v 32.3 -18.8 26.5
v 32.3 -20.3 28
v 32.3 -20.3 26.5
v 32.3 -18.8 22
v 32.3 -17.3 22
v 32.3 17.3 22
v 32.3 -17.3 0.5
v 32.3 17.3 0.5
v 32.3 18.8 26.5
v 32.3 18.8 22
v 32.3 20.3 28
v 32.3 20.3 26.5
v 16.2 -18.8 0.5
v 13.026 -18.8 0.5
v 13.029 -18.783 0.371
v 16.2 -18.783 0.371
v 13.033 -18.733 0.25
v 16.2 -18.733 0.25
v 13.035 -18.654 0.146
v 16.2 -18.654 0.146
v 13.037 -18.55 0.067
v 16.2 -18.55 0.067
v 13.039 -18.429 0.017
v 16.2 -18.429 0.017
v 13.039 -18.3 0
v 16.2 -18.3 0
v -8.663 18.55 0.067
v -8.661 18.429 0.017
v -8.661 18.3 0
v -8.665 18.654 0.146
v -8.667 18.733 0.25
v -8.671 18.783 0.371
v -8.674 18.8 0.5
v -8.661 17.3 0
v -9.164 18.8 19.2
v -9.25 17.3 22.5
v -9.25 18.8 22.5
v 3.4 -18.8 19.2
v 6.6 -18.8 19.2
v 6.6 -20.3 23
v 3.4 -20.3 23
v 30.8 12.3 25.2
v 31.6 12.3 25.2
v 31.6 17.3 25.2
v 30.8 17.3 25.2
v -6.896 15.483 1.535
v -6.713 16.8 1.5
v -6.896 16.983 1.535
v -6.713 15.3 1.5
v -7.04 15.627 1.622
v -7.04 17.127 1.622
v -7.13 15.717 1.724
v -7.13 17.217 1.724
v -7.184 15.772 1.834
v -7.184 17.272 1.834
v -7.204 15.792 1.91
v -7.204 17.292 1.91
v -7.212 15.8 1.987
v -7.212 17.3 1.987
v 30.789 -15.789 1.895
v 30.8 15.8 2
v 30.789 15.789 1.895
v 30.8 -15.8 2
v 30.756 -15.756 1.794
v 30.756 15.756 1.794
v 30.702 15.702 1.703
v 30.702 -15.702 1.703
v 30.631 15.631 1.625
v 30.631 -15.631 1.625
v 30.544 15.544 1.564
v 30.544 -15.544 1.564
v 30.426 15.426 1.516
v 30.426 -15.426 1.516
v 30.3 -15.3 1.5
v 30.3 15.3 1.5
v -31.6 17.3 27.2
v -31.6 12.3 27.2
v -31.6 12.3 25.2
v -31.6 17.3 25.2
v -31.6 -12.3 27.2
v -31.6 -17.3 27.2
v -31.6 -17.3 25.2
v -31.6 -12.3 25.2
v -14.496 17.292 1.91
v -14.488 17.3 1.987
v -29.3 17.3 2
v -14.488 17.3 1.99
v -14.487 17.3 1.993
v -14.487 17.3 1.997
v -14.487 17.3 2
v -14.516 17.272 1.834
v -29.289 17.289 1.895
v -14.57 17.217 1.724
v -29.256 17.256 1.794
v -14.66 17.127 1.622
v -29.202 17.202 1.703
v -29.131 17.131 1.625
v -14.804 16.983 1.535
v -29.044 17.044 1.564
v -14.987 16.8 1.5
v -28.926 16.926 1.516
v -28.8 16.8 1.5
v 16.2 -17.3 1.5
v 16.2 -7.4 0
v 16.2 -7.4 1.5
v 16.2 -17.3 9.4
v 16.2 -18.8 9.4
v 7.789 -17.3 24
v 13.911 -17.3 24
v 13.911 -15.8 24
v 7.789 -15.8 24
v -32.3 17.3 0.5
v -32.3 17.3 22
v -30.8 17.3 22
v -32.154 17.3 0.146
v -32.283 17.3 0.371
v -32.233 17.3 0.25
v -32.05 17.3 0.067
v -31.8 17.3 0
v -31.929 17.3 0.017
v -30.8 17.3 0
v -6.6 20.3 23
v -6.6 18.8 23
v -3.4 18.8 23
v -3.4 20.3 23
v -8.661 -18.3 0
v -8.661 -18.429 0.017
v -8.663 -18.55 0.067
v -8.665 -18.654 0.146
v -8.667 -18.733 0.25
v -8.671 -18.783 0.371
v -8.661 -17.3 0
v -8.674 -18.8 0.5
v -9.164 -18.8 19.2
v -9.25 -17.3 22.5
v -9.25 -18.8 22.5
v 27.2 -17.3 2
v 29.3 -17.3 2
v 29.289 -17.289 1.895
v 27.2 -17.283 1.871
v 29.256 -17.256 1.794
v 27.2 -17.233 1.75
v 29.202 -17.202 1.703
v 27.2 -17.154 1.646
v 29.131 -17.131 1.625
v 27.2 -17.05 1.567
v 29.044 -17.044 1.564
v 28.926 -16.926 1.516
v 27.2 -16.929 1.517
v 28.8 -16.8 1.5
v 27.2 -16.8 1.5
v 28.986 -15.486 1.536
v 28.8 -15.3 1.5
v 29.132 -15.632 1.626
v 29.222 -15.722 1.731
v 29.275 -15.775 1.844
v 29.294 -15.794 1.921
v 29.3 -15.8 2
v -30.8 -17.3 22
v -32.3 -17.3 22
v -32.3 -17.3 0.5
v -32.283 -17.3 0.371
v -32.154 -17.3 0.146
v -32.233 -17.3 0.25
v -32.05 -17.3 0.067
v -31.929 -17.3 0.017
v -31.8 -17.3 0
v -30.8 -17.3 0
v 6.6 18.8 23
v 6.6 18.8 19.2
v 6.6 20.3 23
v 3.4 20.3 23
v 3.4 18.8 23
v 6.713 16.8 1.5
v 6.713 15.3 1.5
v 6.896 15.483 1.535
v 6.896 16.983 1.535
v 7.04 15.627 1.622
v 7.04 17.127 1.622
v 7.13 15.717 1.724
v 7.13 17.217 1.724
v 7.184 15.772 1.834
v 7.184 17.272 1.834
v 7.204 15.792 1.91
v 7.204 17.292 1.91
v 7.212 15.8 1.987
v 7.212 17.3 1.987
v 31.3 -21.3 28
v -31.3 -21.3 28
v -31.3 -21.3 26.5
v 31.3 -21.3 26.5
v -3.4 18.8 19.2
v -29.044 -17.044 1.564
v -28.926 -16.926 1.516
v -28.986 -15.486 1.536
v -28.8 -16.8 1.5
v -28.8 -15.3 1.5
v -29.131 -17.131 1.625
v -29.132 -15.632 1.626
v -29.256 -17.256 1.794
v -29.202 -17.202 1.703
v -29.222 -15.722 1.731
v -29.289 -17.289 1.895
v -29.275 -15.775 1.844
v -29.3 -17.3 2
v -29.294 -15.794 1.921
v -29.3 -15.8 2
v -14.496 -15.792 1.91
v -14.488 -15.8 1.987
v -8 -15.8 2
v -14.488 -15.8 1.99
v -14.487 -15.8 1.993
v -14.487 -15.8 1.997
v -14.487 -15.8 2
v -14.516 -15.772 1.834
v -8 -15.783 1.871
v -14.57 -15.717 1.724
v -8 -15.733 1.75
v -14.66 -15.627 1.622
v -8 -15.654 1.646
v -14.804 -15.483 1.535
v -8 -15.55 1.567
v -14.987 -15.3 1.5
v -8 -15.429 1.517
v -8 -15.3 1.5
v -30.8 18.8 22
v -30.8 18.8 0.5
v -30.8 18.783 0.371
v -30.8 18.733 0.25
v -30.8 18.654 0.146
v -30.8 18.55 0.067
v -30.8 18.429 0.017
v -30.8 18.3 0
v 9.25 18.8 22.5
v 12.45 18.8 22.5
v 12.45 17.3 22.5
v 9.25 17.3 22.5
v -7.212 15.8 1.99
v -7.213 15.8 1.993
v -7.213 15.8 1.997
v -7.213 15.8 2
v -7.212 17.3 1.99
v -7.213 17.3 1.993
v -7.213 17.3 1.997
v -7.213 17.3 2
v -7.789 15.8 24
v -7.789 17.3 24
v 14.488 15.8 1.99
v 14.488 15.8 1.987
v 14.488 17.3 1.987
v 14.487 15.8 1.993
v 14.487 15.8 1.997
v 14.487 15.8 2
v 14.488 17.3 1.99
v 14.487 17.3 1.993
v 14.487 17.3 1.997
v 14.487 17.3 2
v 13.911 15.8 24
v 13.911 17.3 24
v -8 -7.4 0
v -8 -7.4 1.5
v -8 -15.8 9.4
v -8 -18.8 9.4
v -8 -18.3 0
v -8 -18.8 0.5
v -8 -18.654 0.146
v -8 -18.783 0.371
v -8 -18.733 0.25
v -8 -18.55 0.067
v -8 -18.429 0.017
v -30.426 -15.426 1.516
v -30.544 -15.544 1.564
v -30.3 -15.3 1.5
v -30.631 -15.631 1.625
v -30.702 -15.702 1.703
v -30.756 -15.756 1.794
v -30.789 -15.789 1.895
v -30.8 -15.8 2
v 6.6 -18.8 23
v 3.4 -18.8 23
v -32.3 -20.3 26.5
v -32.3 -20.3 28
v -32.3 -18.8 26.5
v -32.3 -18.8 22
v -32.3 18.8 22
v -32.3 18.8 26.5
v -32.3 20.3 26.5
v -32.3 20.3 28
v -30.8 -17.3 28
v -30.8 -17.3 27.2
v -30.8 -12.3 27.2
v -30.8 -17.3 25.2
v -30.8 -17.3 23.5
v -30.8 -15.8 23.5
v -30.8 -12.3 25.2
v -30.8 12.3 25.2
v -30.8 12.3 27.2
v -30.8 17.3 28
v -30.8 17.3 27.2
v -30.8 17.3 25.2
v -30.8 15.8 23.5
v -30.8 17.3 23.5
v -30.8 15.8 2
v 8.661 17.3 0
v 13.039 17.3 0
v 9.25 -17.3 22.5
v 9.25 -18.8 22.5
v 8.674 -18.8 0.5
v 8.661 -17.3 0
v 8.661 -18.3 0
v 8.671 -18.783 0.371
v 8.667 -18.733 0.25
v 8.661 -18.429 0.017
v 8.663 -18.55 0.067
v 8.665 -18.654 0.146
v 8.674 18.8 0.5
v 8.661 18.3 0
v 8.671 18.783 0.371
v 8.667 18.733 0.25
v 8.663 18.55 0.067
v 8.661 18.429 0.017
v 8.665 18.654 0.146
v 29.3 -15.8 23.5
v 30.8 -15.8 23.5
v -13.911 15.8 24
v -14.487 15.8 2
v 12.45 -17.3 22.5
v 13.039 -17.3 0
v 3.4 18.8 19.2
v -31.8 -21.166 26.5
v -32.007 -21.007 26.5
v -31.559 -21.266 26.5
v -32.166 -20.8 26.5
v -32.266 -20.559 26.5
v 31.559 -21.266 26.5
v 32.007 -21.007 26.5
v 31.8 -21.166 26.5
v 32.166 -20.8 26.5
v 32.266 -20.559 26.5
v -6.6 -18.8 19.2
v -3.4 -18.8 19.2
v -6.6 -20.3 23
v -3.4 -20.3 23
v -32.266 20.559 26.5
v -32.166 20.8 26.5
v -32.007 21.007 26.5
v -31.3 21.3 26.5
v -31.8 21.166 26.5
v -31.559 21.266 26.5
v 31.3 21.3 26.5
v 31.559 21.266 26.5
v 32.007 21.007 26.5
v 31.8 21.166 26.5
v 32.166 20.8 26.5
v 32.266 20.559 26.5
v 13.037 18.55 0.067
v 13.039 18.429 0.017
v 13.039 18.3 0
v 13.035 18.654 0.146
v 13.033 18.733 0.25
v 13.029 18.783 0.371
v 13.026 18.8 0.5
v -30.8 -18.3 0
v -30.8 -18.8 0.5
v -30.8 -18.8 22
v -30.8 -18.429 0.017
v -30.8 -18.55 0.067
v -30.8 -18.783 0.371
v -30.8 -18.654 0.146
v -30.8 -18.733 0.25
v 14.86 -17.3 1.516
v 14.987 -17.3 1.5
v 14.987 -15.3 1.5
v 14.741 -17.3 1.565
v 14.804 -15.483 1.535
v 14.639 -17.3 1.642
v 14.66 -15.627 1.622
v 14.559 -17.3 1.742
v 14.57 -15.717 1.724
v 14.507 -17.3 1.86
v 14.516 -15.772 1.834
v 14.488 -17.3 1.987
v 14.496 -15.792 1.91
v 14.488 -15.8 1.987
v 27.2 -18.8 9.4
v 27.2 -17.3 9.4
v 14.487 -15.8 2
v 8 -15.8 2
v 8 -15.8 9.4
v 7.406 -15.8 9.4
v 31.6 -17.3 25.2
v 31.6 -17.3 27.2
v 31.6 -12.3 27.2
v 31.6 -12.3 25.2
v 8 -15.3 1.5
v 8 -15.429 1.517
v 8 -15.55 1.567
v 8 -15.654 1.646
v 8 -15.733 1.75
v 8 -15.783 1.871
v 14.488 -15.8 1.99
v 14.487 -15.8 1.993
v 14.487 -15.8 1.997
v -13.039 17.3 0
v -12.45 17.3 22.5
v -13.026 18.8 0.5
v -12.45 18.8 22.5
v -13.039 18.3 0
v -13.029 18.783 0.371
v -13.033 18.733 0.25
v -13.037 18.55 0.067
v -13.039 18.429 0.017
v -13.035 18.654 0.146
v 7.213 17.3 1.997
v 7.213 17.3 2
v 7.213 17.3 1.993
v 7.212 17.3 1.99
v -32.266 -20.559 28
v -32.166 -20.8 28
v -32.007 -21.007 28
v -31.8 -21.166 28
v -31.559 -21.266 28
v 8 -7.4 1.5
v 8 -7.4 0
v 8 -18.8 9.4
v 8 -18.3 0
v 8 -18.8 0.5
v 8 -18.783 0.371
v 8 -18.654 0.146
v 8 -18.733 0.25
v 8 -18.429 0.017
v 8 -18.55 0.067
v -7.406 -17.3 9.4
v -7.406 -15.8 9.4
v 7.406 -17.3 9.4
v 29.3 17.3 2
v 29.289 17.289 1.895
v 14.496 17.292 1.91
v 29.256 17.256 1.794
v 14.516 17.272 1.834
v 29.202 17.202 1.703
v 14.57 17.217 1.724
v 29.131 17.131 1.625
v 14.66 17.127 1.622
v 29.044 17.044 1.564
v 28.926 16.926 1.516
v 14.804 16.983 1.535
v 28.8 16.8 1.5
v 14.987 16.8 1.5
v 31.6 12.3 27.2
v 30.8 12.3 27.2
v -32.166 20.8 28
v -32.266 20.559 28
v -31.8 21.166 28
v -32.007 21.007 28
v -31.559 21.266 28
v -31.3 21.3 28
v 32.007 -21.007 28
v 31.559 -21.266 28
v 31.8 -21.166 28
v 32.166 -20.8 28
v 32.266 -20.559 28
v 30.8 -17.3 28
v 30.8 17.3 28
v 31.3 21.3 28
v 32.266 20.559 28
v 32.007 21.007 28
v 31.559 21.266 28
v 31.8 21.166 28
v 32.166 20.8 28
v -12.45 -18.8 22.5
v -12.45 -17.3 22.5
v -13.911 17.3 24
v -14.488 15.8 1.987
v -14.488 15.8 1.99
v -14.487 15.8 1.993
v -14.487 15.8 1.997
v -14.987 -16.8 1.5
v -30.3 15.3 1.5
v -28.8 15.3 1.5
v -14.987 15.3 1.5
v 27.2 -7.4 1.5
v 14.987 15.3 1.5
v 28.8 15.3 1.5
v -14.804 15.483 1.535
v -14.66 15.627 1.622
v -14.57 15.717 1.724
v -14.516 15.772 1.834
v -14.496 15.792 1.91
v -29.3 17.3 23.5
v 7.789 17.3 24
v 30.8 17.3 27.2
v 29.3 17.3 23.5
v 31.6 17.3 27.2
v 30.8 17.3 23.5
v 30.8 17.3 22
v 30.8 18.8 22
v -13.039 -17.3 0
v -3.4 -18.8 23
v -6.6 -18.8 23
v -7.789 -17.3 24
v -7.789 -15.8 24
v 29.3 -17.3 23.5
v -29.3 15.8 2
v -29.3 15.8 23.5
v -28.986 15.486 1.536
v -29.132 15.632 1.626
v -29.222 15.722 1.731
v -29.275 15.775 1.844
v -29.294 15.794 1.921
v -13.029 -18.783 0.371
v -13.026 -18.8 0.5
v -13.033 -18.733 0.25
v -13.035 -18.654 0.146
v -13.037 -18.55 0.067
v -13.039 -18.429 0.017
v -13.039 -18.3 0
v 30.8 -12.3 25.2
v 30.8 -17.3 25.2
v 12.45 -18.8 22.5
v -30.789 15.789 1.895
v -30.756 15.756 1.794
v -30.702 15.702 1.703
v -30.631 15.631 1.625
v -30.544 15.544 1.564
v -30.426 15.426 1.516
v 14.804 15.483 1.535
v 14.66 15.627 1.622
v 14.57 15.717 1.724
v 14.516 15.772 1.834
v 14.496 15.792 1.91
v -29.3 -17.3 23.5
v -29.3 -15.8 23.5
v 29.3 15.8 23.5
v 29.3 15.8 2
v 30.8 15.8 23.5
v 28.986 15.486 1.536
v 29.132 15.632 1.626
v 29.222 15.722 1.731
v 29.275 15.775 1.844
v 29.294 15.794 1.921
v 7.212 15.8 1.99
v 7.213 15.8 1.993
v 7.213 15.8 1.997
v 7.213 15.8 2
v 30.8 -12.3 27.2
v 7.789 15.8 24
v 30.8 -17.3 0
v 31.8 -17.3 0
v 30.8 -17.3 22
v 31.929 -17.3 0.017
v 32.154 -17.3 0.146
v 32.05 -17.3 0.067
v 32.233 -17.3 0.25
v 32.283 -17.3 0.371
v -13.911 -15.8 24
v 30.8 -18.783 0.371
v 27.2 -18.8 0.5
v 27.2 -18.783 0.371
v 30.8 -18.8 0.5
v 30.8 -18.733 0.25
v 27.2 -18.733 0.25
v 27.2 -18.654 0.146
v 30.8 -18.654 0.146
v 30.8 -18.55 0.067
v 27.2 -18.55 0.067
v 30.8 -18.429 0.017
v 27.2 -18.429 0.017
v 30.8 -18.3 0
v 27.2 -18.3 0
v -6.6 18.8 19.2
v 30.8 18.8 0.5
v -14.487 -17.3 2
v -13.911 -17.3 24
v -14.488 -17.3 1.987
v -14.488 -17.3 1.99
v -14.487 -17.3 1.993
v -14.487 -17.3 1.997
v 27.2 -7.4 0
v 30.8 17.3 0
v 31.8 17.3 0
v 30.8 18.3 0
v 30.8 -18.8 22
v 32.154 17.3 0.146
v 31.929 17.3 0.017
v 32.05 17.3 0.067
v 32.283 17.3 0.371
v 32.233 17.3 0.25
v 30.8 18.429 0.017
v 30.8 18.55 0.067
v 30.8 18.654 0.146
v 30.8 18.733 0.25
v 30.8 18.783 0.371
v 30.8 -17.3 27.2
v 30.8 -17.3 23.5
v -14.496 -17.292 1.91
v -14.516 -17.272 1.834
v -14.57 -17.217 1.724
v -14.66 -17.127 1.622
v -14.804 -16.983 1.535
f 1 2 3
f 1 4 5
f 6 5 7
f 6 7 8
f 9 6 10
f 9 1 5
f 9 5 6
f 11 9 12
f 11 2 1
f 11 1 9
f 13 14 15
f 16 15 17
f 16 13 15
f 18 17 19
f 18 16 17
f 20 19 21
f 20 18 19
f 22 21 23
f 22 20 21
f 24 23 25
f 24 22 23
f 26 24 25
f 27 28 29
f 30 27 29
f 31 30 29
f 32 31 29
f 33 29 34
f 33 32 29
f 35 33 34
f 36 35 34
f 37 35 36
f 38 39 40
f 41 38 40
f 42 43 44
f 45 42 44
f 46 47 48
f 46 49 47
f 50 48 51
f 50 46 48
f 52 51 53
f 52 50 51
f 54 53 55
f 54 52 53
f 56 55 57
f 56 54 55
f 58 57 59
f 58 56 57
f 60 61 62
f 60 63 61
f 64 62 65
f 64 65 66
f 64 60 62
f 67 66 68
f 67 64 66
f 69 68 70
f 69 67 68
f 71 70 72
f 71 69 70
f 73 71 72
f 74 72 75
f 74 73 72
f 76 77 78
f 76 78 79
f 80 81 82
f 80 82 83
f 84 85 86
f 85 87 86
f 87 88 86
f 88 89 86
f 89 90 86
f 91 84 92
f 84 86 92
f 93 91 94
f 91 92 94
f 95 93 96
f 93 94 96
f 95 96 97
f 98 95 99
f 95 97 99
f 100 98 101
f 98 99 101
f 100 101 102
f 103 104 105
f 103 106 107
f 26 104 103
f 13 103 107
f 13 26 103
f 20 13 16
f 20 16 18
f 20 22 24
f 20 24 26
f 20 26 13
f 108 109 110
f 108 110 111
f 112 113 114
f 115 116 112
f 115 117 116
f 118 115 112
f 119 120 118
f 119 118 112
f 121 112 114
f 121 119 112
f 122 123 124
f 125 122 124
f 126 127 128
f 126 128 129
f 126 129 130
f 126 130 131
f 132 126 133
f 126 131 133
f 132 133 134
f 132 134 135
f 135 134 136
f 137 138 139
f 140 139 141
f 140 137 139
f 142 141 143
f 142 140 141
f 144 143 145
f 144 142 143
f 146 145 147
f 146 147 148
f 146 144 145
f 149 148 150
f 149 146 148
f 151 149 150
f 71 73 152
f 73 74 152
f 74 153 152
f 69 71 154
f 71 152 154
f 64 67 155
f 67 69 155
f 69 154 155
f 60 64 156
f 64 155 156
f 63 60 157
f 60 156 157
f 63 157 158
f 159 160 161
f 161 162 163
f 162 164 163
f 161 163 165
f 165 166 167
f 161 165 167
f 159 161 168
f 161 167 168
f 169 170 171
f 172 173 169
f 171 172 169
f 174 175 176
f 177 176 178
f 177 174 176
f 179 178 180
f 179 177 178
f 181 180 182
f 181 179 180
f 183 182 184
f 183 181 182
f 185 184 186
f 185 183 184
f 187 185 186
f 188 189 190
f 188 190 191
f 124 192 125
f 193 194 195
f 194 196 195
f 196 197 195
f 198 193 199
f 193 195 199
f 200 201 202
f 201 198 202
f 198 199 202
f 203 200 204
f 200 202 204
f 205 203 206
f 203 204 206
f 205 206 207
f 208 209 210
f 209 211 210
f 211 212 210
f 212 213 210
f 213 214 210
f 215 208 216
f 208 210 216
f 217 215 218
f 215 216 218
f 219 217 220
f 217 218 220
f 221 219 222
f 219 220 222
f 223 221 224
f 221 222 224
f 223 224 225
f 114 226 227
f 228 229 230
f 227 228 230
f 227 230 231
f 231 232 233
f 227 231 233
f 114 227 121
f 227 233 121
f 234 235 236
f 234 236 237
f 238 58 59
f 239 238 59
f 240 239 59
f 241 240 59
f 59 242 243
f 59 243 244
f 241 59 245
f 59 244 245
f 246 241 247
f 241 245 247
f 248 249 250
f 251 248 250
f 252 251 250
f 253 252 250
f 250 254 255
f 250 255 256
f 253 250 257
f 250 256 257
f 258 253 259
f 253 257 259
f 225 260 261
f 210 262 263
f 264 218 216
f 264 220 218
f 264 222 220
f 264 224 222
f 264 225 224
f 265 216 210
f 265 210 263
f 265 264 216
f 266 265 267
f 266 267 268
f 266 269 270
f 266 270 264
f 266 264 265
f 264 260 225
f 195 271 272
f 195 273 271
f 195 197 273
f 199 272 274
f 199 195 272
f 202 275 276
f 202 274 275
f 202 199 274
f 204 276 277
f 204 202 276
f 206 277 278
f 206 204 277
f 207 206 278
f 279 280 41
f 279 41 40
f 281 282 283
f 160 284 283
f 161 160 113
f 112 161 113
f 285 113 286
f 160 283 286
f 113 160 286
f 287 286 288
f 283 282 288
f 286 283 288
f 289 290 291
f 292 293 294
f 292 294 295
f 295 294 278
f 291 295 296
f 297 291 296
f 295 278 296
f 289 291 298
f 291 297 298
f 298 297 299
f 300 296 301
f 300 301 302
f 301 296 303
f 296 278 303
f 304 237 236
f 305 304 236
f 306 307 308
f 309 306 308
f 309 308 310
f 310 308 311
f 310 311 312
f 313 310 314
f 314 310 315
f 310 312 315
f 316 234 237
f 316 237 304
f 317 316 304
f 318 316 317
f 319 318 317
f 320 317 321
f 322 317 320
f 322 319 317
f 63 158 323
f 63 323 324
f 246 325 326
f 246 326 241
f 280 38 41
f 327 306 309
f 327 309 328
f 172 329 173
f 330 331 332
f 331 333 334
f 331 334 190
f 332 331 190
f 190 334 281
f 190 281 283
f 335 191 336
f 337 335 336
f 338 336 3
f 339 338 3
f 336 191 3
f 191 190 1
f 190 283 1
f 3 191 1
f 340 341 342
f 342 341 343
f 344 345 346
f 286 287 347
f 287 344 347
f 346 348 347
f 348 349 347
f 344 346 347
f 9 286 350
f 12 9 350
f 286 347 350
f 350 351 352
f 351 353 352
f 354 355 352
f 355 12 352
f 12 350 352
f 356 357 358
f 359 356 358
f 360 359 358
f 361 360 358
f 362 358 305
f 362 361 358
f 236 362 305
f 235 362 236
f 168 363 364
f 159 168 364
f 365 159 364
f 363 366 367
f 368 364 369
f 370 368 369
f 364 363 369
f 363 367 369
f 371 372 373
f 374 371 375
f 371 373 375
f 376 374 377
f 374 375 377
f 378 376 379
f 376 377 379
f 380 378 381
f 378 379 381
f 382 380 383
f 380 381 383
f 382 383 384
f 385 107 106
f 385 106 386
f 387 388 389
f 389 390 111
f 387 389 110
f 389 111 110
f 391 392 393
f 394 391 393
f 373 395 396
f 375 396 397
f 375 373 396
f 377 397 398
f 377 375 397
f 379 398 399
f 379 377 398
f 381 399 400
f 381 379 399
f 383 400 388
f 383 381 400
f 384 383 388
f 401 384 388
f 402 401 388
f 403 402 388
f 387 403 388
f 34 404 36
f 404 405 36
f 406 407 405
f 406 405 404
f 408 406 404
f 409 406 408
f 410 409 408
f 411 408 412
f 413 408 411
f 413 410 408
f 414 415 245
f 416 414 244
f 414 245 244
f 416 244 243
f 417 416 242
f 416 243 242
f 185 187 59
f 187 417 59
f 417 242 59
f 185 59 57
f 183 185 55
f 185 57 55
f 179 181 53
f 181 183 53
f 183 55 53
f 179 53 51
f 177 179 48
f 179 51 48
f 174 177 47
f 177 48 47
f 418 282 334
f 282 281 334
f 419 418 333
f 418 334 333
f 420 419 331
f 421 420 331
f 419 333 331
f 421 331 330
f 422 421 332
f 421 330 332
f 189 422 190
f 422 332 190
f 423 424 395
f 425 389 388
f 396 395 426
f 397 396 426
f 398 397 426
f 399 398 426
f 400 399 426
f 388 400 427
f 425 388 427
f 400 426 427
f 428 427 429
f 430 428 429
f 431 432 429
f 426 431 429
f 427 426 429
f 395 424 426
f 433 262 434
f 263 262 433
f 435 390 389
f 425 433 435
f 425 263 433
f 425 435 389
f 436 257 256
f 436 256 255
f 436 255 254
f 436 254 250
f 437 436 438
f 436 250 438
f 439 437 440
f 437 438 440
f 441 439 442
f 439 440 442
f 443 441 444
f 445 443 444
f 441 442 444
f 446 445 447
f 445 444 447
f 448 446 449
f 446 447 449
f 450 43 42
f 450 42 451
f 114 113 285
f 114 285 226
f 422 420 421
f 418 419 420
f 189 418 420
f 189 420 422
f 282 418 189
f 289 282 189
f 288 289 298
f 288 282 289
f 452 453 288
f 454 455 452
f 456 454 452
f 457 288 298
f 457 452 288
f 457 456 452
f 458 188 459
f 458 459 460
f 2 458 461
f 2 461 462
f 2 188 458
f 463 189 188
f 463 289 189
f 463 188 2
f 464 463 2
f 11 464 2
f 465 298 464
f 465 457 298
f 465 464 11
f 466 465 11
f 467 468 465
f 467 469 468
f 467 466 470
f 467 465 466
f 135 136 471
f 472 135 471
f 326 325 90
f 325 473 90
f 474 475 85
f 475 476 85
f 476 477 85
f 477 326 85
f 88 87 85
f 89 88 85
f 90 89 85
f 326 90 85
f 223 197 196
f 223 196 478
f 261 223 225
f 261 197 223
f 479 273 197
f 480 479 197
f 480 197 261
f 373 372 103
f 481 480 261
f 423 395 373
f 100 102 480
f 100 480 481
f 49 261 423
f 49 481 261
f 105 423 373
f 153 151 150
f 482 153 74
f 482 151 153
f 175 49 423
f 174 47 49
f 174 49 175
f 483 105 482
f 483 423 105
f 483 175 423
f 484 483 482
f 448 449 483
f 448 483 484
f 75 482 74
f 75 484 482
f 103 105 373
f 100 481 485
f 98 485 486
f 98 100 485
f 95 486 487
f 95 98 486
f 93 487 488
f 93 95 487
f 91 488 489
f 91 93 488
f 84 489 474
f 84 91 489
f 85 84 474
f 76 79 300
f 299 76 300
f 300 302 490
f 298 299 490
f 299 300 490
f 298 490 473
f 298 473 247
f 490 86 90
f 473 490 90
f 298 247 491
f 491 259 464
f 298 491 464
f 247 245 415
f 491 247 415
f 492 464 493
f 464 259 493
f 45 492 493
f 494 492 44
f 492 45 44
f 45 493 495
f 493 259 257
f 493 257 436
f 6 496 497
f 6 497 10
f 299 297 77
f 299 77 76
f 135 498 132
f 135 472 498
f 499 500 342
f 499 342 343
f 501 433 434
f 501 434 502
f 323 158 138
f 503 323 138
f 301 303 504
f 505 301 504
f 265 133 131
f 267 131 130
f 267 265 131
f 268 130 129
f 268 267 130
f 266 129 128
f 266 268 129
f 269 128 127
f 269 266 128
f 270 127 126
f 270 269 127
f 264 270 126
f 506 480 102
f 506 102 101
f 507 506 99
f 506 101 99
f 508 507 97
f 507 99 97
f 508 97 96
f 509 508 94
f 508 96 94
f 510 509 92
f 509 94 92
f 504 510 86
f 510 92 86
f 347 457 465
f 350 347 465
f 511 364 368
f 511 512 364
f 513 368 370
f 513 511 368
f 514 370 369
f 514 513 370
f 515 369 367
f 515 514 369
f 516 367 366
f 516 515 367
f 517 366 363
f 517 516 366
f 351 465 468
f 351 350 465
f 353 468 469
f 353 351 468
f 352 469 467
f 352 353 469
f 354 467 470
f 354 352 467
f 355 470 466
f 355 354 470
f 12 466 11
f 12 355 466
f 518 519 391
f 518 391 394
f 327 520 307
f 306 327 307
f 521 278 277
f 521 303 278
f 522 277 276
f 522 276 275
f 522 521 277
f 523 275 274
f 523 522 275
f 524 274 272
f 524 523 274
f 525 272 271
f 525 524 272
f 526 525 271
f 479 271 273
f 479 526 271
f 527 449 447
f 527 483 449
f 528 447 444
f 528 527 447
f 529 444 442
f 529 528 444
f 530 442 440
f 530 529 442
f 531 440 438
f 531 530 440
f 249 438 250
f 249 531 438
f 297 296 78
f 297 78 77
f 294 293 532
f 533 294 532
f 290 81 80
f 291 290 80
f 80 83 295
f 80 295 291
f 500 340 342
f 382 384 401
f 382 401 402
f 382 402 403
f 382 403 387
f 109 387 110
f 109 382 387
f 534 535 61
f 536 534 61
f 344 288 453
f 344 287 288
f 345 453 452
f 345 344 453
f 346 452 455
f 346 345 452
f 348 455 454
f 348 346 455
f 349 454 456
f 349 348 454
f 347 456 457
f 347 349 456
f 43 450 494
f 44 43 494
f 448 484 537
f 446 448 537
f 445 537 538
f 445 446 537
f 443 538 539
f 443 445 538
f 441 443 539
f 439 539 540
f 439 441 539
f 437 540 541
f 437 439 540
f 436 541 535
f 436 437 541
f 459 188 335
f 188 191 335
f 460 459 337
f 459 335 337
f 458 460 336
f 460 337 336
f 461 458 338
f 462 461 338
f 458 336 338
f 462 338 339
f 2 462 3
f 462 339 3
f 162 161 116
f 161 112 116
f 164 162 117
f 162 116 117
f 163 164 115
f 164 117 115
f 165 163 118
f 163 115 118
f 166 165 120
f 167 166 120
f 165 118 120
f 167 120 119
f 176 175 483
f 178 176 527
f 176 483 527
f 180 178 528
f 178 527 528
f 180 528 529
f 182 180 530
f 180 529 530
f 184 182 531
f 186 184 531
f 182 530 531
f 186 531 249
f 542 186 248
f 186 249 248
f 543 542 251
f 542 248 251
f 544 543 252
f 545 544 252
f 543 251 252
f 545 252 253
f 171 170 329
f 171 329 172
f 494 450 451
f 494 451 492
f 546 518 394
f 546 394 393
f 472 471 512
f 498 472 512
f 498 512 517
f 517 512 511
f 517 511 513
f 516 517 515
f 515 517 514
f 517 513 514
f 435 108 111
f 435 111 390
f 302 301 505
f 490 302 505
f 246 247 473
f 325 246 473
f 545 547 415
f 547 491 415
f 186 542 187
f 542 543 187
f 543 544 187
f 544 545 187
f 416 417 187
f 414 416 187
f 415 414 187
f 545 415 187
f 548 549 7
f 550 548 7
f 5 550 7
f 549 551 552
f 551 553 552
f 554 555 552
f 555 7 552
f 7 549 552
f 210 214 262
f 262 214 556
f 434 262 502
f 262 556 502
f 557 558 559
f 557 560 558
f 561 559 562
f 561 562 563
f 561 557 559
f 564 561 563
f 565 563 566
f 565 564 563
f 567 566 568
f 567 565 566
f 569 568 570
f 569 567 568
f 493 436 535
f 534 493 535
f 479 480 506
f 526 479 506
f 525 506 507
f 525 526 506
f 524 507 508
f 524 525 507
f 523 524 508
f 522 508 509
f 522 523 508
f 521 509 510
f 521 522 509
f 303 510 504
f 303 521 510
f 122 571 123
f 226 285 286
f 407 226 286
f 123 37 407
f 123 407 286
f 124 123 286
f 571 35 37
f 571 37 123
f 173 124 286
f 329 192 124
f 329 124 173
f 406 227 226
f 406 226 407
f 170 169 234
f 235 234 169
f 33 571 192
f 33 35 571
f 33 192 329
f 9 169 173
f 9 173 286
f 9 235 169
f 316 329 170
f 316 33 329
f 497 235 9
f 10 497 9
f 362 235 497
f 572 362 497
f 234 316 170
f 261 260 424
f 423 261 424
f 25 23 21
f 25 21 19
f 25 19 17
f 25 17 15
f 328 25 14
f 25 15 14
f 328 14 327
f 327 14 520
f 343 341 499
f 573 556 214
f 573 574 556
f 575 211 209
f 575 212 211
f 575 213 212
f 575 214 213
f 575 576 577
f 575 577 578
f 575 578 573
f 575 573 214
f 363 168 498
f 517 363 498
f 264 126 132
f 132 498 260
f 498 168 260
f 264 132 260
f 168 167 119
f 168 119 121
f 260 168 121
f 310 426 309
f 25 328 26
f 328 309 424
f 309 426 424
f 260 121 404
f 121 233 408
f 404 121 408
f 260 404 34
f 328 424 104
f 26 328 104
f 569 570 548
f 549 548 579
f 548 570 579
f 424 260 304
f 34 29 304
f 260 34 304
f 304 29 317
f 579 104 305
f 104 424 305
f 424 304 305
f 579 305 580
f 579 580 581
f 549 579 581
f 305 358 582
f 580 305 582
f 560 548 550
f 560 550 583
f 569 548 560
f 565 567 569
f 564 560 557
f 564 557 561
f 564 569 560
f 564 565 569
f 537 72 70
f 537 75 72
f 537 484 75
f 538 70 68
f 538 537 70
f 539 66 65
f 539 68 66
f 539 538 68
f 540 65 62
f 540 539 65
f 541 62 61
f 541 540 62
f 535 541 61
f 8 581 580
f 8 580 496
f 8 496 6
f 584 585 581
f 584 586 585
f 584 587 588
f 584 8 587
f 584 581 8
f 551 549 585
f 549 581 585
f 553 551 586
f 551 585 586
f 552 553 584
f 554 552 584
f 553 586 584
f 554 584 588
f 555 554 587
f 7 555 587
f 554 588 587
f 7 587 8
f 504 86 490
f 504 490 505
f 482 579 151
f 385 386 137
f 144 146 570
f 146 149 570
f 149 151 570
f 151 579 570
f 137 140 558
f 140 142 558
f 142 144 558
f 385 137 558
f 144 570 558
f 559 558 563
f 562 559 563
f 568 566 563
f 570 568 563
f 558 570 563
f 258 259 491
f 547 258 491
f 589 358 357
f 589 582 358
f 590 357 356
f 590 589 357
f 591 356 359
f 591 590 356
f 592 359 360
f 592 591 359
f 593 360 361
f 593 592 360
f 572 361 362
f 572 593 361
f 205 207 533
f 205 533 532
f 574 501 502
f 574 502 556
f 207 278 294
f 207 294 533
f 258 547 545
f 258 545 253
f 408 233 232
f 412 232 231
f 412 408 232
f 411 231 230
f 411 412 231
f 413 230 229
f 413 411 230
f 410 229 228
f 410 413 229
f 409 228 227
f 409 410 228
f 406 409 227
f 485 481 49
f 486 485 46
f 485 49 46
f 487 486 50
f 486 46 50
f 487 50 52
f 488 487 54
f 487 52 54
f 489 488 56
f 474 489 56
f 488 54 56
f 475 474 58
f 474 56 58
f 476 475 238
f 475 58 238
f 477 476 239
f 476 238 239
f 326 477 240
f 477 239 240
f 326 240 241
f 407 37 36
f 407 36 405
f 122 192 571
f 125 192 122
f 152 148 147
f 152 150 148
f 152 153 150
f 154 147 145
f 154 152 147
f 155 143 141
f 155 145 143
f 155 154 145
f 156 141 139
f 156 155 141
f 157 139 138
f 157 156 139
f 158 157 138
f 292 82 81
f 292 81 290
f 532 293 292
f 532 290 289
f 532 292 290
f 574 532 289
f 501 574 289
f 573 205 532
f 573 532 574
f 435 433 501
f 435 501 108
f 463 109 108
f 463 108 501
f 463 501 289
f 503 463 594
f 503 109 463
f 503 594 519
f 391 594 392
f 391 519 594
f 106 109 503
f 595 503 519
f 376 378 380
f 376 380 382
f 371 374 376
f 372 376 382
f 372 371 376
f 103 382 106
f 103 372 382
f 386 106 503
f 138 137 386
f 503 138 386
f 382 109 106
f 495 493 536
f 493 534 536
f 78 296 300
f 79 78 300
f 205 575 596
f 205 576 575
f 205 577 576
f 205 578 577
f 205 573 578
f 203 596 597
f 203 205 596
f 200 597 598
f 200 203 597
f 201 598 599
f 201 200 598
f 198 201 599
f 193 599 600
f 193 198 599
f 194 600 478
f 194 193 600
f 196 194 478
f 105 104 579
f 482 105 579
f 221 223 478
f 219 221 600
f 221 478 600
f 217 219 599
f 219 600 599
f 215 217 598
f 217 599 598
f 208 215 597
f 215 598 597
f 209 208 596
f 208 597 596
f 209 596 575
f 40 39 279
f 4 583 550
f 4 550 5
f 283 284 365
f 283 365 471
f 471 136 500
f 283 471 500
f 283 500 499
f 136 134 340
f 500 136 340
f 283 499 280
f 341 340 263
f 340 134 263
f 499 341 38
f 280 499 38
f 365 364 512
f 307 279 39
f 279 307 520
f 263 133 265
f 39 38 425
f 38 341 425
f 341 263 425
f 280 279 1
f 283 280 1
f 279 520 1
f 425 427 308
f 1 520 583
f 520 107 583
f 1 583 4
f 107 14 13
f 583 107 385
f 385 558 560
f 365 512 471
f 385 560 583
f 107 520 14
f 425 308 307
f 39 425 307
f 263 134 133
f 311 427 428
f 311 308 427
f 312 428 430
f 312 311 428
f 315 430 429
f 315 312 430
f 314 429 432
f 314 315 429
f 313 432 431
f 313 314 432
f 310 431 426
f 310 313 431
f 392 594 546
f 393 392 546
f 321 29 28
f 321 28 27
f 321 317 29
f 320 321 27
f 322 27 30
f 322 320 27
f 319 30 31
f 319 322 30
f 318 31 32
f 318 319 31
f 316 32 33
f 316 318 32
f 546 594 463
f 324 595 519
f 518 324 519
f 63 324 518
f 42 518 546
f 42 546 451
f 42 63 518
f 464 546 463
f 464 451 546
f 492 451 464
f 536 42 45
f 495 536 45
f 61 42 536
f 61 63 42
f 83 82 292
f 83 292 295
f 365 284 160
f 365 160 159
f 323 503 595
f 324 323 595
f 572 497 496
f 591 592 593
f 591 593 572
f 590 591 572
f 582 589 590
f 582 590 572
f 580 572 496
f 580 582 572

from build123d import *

# Parameters (mm, degrees)
F0_W      = 64.6
F0_H      = 37.6
F1_DEPTH  = 28
F3_DEPTH  = 1.5
F4_W      = 1.5
F4_H      = 1.5
F5_DEPTH  = 22
F6_T      = -1.5
F7_W      = 64.6
F7_H      = 2.5
F8_DEPTH  = 1.5
F9_W      = 5
F9_H      = 2
F10_DEPTH = 31.6
F11_W     = 3.2
F11_H     = 3.8
F12_DEPTH = 1.5
F14_DEPTH = 38.901
F15_W     = 16
F15_H     = 11.4
F15_W_2   = 11
F16_DEPTH = 9.4
F17_R     = 1
F18_R     = 0.5


# Not quite as in the source:
# - two fillets or chamfers of one size are made in one step
# - a pattern or mirror of a feature is missing from the dataset's text; its kind, count and spacing are read off the source's solid


with BuildPart() as f1:
    # F0 (on Top) → F1 (new body)
    with BuildSketch(Plane.XY):
        Rectangle(F0_W, F0_H)
    extrude(amount=F1_DEPTH)

    # F2 (on face) → F3 (cut)
    with BuildSketch(Plane.XZ.offset(18.8)):
        Polygon((-13.0391832353, 0), (-8.6608167647, 0), (-9.25, 22.5), (-12.45, 22.5), align=None)
        Polygon((12.45, 22.5), (9.25, 22.5), (8.6608167647, 0), (13.0391832353, 0), align=None)
    f3 = extrude(amount=-F3_DEPTH, mode=Mode.SUBTRACT)

    # F3_copies: F3 across plane
    add(f3.mirror(Plane.ZX), mode=Mode.SUBTRACT)

    # F4 (on face) → F5 (cut)
    with BuildSketch(Plane(origin=(0, 0, 0), x_dir=(1, 0, 0), z_dir=(0, 0, -1))):
        with Locations((-31.55, 18.05)):
            Rectangle(F4_W, F4_H)
        with Locations((31.55, 18.05)):
            Rectangle(F4_W, F4_H)
        with Locations((31.55, -18.05)):
            Rectangle(F4_W, F4_H)
        with Locations((-31.55, -18.05)):
            Rectangle(F4_W, F4_H)
    extrude(amount=-F5_DEPTH, mode=Mode.SUBTRACT)

    # F6
    f6_openings = [f1.faces().sort_by_distance(p)[0] for p in [
        (0, 0, 28),
    ]]
    offset(amount=F6_T, openings=f6_openings, kind=Kind.INTERSECTION)

    # F7 (on face) → F8 (join)
    with BuildSketch(Plane.XY.offset(28)):
        with Locations((0, -20.05)):
            Rectangle(F7_W, F7_H)
        with Locations((0, 20.05)):
            Rectangle(F7_W, F7_H)
    extrude(amount=-F8_DEPTH)

    # F9 (on Right) → F10 (cut, symmetric)
    with BuildSketch(Plane.YZ):
        with Locations((-14.8, 26.2)):
            Rectangle(F9_W, F9_H)
        with Locations((14.8, 26.2)):
            Rectangle(F9_W, F9_H)
    extrude(amount=F10_DEPTH, both=True, mode=Mode.SUBTRACT)

    # F11 (on face) → F12 (join)
    with BuildSketch(Plane.XZ.offset(18.8)):
        with Locations((-5, 21.1)):
            Rectangle(F11_W, F11_H)
        with Locations((5, 21.1)):
            Rectangle(F11_W, F11_H)
    f12 = extrude(amount=F12_DEPTH)

    # F12_copies: F12 across plane
    add(f12.mirror(Plane.ZX))

    # F13 (on face) → F14 (cut, through all)
    with BuildSketch(Plane.YZ.offset(6.6)):
        Polygon((-18.8, 19.2), (-20.3, 23), (-20.3, 19.2), align=None)
    f14 = extrude(amount=-F14_DEPTH, mode=Mode.SUBTRACT)

    # F14_copies: F14 across plane
    add(f14.mirror(Plane.ZX), mode=Mode.SUBTRACT)

    # F15 (on face) → F16 (cut)
    with BuildSketch(Plane(origin=(0, 0, 0), x_dir=(1, 0, 0), z_dir=(0, 0, -1))):
        with Locations((0, 13.1)):
            Rectangle(F15_W, F15_H)
        with Locations((21.7, 13.1)):
            Rectangle(F15_W_2, F15_H)
    extrude(amount=-F16_DEPTH, mode=Mode.SUBTRACT)

    # F17
    f17_edges = [f1.edges().sort_by_distance(p)[0] for p in [
        (32.3, -21.3, 27.25),
        (32.3, 21.3, 27.25),
        (-32.3, -21.3, 27.25),
        (-32.3, 21.3, 27.25),
    ]]
    fillet(f17_edges, radius=F17_R)

    # F18
    f18_edges = [f1.edges().sort_by_distance(p)[0] for p in [
        (32.3, 0, 0),
        (29, -18.8, 0),
        (14.619592, -18.8, 0),
        (-8.330408, -18.8, 0),
        (-21.919592, -18.8, 0),
        (-32.3, 0, 0),
        (0, 18.8, 0),
        (8.330408, -18.8, 0),
        (-21.919592, 18.8, 0),
        (21.919592, 18.8, 0),
        (30.8, 0, 1.5),
        (-21.900209, -17.3, 1.5),
        (28.25, -17.3, 1.5),
        (-30.8, 0, 1.5),
        (-21.900209, 17.3, 1.5),
        (0, 17.3, 1.5),
        (21.900209, 17.3, 1.5),
        (29.3, -16.55, 1.5),
        (14.500419, -16.55, 1.5),
        (11.250209, -15.8, 1.5),
        (-11.250209, -15.8, 1.5),
        (-14.500419, -16.55, 1.5),
        (-29.3, -16.55, 1.5),
        (-30.05, -15.8, 1.5),
        (-30.05, 15.8, 1.5),
        (-29.3, 16.55, 1.5),
        (-14.500419, 16.55, 1.5),
        (-10.85, 15.8, 1.5),
        (-7.199581, 16.55, 1.5),
        (7.199581, 16.55, 1.5),
        (10.85, 15.8, 1.5),
        (14.500419, 16.55, 1.5),
        (29.3, 16.55, 1.5),
        (30.05, 15.8, 1.5),
        (30.05, -15.8, 1.5),
    ]]
    fillet(f18_edges, radius=F18_R)


solid = f1.part
